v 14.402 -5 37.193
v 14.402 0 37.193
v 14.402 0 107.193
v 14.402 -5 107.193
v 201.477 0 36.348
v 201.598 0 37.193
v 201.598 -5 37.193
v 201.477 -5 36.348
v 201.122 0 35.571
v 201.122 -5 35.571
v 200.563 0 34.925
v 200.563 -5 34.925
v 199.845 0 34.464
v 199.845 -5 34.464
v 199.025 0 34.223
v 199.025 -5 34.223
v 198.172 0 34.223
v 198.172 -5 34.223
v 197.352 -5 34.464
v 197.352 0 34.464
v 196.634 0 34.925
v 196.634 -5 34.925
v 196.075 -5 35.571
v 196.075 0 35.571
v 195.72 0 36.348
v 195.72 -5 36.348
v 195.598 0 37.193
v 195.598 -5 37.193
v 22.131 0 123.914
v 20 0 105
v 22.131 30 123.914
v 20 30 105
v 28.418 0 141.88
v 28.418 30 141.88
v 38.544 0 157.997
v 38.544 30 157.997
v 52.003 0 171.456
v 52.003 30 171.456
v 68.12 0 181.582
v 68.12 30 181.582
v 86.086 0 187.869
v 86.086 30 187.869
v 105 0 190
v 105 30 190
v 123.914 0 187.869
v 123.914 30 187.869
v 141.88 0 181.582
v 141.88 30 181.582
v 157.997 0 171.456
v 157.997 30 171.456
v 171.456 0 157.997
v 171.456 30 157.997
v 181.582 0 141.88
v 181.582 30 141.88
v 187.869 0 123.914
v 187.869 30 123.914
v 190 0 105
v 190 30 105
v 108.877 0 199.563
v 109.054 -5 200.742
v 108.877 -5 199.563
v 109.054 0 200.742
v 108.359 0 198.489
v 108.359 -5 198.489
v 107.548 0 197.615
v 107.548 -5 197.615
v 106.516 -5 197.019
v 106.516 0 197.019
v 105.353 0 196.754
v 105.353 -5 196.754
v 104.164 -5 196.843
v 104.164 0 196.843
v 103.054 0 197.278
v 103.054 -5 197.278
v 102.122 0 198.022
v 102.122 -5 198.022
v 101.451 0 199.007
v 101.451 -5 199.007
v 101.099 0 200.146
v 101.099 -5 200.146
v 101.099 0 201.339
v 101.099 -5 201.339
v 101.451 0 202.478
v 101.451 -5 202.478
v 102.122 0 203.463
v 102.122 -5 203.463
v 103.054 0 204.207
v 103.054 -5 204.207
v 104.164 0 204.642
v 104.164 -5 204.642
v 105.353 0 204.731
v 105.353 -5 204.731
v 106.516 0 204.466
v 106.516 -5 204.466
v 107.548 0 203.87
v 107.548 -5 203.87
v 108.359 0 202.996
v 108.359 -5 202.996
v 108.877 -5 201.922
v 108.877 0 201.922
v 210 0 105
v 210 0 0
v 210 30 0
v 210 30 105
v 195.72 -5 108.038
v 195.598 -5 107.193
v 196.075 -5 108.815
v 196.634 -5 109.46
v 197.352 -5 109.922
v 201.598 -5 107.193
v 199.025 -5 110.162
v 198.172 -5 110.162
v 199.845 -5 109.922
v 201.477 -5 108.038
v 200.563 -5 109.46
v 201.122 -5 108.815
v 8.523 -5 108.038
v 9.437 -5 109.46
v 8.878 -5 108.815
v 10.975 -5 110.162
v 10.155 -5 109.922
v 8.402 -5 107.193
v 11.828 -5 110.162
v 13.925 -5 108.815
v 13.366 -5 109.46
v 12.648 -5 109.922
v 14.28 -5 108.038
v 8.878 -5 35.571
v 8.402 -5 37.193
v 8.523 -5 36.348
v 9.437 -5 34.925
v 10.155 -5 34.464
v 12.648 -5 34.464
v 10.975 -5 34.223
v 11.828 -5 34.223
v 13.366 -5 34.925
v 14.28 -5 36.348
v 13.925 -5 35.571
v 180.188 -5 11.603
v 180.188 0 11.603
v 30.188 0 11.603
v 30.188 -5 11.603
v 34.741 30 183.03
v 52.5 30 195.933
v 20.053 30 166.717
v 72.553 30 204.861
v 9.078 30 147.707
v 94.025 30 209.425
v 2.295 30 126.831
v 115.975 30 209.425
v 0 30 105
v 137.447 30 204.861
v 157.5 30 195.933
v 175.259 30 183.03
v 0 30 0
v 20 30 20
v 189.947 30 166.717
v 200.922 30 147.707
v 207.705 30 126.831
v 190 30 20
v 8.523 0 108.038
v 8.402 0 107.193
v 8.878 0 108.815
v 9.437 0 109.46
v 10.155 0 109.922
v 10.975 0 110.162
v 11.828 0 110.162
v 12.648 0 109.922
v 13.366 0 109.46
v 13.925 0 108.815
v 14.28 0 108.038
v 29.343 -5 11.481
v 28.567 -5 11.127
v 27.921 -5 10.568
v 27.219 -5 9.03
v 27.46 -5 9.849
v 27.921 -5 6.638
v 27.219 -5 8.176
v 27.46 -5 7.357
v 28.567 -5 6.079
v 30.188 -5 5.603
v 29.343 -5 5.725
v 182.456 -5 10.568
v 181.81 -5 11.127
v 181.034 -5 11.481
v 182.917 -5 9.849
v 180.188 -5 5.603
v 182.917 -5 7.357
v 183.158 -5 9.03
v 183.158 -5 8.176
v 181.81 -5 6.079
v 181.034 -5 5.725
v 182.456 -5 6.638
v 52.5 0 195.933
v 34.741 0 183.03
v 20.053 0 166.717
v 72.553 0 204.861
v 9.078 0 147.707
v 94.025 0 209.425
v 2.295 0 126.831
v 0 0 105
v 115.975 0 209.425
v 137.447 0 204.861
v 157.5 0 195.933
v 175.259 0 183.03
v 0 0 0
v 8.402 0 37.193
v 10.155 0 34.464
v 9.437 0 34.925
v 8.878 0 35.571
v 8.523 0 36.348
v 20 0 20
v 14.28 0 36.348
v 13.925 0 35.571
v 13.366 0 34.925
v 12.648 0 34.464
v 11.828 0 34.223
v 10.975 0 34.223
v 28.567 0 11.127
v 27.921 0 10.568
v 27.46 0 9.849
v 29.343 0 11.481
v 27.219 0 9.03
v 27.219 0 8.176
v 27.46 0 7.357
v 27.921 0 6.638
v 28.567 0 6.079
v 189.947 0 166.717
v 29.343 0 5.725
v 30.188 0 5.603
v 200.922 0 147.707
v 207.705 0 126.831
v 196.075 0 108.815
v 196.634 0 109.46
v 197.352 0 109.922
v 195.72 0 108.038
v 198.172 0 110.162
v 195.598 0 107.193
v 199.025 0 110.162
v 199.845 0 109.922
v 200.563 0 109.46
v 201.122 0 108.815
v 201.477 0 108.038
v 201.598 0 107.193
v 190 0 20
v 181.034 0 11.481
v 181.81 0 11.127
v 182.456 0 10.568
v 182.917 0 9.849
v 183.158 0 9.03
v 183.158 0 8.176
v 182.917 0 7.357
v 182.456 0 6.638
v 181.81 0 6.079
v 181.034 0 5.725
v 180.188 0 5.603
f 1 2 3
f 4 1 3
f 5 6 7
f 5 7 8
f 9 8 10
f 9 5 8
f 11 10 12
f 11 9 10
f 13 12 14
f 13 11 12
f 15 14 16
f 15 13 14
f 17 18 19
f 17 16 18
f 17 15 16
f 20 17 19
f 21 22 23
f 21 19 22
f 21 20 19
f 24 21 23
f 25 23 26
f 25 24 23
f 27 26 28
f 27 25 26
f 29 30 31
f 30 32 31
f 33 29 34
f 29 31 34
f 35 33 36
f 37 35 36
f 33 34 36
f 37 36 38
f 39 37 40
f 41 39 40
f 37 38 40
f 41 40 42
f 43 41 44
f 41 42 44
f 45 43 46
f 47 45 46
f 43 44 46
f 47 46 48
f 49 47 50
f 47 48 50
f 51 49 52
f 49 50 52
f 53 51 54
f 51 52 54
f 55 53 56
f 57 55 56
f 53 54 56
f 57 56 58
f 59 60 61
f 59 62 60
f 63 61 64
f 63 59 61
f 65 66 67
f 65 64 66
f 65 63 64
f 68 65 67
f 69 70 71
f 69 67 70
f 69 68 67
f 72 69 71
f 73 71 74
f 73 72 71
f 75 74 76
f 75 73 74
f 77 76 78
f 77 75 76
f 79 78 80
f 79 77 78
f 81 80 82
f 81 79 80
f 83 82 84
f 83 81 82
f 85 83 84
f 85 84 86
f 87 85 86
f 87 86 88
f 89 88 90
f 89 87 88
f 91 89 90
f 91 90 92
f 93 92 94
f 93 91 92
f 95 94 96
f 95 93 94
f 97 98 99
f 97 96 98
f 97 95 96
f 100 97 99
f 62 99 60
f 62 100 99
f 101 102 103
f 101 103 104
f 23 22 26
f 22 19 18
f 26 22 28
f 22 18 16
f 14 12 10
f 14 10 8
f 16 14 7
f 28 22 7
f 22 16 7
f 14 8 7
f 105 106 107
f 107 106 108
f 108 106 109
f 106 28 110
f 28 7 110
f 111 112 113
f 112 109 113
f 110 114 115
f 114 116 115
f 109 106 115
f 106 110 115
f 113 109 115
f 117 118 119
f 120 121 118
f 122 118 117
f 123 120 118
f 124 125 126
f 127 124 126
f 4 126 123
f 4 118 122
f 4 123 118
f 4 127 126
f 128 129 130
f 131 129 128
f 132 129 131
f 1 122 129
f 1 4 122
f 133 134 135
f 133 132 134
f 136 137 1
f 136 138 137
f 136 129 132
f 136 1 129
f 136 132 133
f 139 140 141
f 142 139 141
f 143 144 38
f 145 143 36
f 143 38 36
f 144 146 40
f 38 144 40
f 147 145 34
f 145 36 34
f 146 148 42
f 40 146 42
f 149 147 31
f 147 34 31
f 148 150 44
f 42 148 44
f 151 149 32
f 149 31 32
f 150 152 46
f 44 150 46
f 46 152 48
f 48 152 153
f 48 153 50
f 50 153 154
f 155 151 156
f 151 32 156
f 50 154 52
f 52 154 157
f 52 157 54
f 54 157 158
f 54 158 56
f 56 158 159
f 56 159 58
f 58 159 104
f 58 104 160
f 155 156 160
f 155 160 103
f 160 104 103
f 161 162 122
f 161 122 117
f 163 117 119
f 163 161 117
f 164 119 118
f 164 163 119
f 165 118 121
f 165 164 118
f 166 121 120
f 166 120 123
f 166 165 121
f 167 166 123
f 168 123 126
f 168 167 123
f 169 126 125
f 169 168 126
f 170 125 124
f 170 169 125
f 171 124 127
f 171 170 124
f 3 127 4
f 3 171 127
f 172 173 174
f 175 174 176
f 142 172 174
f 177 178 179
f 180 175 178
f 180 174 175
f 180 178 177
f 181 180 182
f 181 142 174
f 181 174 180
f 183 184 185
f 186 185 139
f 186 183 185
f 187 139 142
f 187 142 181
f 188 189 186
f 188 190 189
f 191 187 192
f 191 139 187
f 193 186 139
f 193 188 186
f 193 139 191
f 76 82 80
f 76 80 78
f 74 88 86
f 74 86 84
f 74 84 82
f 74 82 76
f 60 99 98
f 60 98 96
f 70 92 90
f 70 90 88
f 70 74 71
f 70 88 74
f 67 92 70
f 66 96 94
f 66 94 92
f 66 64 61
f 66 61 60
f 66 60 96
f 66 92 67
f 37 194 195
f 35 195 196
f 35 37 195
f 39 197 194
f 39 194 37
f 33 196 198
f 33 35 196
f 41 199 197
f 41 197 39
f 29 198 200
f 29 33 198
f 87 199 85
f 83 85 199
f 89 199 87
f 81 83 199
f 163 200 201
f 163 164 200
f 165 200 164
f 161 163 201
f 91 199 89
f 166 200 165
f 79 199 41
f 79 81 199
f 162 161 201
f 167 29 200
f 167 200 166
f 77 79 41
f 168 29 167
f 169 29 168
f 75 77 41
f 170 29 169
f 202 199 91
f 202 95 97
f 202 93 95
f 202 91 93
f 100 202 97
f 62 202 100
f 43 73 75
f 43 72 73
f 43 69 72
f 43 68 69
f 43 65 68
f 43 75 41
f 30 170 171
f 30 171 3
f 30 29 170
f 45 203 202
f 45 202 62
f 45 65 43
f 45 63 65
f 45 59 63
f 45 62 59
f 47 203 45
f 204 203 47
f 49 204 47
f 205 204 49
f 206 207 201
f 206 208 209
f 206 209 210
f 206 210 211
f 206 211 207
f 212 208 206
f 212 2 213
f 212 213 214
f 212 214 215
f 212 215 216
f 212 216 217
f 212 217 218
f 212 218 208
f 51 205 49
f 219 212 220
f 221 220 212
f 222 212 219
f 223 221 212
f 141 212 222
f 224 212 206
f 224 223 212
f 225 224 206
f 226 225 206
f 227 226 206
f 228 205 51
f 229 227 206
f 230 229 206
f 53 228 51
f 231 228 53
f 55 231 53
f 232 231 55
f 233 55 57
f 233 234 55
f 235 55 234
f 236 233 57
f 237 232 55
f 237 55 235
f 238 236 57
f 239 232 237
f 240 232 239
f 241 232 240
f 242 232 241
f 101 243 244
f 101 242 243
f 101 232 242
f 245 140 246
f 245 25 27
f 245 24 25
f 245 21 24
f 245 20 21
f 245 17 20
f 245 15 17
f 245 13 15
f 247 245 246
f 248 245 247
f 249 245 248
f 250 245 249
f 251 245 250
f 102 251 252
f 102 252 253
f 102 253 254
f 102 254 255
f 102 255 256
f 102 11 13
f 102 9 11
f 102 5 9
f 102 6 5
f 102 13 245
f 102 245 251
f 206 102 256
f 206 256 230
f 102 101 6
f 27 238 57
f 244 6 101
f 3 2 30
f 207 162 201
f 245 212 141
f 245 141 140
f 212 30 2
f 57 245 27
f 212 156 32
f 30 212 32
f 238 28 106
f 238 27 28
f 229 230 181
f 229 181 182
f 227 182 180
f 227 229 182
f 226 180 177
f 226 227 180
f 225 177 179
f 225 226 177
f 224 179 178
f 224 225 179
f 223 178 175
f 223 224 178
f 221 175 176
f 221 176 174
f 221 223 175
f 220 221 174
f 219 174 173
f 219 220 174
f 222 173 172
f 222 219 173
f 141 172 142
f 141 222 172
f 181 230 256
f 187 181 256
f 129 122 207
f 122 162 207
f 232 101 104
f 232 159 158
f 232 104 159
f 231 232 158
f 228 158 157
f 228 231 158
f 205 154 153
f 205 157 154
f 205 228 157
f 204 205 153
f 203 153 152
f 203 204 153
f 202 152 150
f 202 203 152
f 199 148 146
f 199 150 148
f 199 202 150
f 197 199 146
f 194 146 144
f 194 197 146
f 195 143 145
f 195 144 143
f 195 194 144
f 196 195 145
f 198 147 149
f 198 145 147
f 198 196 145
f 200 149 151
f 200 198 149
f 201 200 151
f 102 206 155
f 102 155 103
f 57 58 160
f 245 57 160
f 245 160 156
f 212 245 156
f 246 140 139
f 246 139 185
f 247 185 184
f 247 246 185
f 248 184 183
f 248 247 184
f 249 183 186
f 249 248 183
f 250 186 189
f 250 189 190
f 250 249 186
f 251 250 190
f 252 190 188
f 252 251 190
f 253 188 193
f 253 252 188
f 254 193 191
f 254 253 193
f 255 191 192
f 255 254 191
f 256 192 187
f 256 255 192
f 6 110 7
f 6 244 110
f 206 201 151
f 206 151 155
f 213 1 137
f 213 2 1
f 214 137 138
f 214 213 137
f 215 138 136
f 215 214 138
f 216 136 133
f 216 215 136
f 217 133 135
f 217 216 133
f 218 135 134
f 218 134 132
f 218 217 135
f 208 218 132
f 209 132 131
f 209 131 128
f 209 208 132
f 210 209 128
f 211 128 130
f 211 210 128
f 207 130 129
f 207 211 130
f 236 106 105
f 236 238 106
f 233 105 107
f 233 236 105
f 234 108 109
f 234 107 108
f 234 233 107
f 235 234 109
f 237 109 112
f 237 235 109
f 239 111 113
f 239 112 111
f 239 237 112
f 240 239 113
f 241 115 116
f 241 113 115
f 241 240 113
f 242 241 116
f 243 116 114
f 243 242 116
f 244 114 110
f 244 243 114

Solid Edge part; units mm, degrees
sketch "Sketch1" plane through (0, 0, 0) normal (0, -1, 0) x (1, 0, 0)
  line L0 (210, 0) -> (210, 105)
  line L1 (0, 0) -> (210, 0)
  line L2 (0, 105) -> (0, 0)
  arc A0 (0, 105) -> (210, 105) centre (105, 105) cw
extrude "Protrusion1" add sketch "Sketch1" against normal blind 30
sketch "Sketch2" plane through (0, 0, 0) normal (0, -1, 0) x (1, 0, 0)
  arc A0 (20, 105) -> (190, 105) centre (105, 105) cw
  line L0 (190, 105) -> (190, 20)
  line L1 (190, 20) -> (20, 20)
  line L2 (20, 20) -> (20, 105)
extrude "ExtrudedCutout_2" cut sketch "Sketch2" along normal mid plane 236.6242
sketch "Sketch3" plane through (0, 0, 0) normal (0, -1, 0) x (1, 0, 0)
  circle A0 centre (105.0544, 200.7425) radius 4
  line L0 (8.4015, 107.1927) -> (8.4015, 37.1927)
  line L1 (14.4015, 37.1927) -> (14.4015, 107.1927)
  arc A1 (14.4015, 37.1927) -> (8.4015, 37.1927) centre (11.4015, 37.1927) cw
  arc A2 (8.4015, 107.1927) -> (14.4015, 107.1927) centre (11.4015, 107.1927) cw
  line L2 (195.5985, 37.1927) -> (195.5985, 107.1927)
  arc A3 (201.5985, 107.1927) -> (195.5985, 107.1927) centre (198.5985, 107.1927) ccw
  line L3 (201.5985, 107.1927) -> (201.5985, 37.1927)
  arc A4 (195.5985, 37.1927) -> (201.5985, 37.1927) centre (198.5985, 37.1927) ccw
  line L4 (180.1885, 11.603) -> (30.1885, 11.603)
  line L5 (30.1885, 5.603) -> (180.1885, 5.603)
  arc A5 (30.1885, 5.603) -> (30.1885, 11.603) centre (30.1885, 8.603) cw
  arc A6 (180.1885, 11.603) -> (180.1885, 5.603) centre (180.1885, 8.603) cw
extrude "ExtrudedProtrusion_4" add sketch "Sketch3" along normal blind 5
